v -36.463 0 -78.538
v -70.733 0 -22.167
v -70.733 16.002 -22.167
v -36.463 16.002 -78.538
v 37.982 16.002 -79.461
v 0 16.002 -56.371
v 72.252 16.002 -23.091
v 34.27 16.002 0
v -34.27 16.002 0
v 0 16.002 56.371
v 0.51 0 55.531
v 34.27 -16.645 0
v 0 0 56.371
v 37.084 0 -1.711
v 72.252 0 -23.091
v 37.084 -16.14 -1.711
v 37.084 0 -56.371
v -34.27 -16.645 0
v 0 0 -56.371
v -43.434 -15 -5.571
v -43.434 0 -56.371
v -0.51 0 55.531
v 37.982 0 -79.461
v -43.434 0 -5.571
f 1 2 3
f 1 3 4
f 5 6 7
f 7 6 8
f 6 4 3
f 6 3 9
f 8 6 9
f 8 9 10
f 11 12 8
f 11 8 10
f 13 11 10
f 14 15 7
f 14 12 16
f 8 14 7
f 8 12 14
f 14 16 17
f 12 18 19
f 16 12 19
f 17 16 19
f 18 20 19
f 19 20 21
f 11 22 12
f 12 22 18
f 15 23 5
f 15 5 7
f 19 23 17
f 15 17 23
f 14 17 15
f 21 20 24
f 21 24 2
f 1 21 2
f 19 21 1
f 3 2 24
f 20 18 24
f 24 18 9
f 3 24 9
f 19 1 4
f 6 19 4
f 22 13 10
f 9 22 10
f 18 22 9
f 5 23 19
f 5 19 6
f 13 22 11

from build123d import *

# Parameters (mm, degrees)
F2_DEPTH = 43.434
F3_DEPTH = 37.084
F4_DEPTH = 16.002
F5_DEPTH = 42.672
F6_DEPTH = 44.45
F7_DEPTH = 25.4
F8_DEPTH = 25.4


with BuildPart() as f2:
    # F1 (on Right) → F2 (new body)
    with BuildSketch(Plane.YZ):
        Polygon((-16.6454371065, 0), (0, -56.3706830144), (0, 0), (0, 55.5314160883), align=None)
    extrude(amount=-F2_DEPTH)

    # F3 (add): a face of the model
    f3_faces = [f2.faces().sort_by_distance(p)[0] for p in [
        (0, -5.5484790355, -0.279755642),
    ]]
    extrude(f3_faces, amount=F3_DEPTH)

    # F0 (on Front) → F4 (join)
    with BuildSketch(Plane.XZ):
        Polygon((0, 56.3706830144), (-34.2700183392, 0), (0, -56.3706830144), (34.2700183392, 0), align=None)
    extrude(amount=-F4_DEPTH)

    # F5 (add): a face of the model
    f5_faces = [f2.faces().sort_by_distance(p)[0] for p in [
        (-17.1350091696, 8.001, -28.1853415072),
    ]]
    extrude(f5_faces, amount=F5_DEPTH)

    # F6 (add): a face of the model
    f6_faces = [f2.faces().sort_by_distance(p)[0] for p in [
        (17.1350091696, 8.001, -28.1853415072),
    ]]
    extrude(f6_faces, amount=F6_DEPTH)

    # F7 (cut): a face of the model
    f7_faces = [f2.faces().sort_by_distance(p)[0] for p in [
        (-28.7931585995, 0, 33.1465043739),
    ]]
    extrude(f7_faces, amount=-F7_DEPTH, mode=Mode.SUBTRACT)

    # F8 (cut): a face of the model
    f8_faces = [f2.faces().sort_by_distance(p)[0] for p in [
        (24.8505885604, 0, 35.6188502379),
    ]]
    extrude(f8_faces, amount=-F8_DEPTH, mode=Mode.SUBTRACT)


solid = f2.part
